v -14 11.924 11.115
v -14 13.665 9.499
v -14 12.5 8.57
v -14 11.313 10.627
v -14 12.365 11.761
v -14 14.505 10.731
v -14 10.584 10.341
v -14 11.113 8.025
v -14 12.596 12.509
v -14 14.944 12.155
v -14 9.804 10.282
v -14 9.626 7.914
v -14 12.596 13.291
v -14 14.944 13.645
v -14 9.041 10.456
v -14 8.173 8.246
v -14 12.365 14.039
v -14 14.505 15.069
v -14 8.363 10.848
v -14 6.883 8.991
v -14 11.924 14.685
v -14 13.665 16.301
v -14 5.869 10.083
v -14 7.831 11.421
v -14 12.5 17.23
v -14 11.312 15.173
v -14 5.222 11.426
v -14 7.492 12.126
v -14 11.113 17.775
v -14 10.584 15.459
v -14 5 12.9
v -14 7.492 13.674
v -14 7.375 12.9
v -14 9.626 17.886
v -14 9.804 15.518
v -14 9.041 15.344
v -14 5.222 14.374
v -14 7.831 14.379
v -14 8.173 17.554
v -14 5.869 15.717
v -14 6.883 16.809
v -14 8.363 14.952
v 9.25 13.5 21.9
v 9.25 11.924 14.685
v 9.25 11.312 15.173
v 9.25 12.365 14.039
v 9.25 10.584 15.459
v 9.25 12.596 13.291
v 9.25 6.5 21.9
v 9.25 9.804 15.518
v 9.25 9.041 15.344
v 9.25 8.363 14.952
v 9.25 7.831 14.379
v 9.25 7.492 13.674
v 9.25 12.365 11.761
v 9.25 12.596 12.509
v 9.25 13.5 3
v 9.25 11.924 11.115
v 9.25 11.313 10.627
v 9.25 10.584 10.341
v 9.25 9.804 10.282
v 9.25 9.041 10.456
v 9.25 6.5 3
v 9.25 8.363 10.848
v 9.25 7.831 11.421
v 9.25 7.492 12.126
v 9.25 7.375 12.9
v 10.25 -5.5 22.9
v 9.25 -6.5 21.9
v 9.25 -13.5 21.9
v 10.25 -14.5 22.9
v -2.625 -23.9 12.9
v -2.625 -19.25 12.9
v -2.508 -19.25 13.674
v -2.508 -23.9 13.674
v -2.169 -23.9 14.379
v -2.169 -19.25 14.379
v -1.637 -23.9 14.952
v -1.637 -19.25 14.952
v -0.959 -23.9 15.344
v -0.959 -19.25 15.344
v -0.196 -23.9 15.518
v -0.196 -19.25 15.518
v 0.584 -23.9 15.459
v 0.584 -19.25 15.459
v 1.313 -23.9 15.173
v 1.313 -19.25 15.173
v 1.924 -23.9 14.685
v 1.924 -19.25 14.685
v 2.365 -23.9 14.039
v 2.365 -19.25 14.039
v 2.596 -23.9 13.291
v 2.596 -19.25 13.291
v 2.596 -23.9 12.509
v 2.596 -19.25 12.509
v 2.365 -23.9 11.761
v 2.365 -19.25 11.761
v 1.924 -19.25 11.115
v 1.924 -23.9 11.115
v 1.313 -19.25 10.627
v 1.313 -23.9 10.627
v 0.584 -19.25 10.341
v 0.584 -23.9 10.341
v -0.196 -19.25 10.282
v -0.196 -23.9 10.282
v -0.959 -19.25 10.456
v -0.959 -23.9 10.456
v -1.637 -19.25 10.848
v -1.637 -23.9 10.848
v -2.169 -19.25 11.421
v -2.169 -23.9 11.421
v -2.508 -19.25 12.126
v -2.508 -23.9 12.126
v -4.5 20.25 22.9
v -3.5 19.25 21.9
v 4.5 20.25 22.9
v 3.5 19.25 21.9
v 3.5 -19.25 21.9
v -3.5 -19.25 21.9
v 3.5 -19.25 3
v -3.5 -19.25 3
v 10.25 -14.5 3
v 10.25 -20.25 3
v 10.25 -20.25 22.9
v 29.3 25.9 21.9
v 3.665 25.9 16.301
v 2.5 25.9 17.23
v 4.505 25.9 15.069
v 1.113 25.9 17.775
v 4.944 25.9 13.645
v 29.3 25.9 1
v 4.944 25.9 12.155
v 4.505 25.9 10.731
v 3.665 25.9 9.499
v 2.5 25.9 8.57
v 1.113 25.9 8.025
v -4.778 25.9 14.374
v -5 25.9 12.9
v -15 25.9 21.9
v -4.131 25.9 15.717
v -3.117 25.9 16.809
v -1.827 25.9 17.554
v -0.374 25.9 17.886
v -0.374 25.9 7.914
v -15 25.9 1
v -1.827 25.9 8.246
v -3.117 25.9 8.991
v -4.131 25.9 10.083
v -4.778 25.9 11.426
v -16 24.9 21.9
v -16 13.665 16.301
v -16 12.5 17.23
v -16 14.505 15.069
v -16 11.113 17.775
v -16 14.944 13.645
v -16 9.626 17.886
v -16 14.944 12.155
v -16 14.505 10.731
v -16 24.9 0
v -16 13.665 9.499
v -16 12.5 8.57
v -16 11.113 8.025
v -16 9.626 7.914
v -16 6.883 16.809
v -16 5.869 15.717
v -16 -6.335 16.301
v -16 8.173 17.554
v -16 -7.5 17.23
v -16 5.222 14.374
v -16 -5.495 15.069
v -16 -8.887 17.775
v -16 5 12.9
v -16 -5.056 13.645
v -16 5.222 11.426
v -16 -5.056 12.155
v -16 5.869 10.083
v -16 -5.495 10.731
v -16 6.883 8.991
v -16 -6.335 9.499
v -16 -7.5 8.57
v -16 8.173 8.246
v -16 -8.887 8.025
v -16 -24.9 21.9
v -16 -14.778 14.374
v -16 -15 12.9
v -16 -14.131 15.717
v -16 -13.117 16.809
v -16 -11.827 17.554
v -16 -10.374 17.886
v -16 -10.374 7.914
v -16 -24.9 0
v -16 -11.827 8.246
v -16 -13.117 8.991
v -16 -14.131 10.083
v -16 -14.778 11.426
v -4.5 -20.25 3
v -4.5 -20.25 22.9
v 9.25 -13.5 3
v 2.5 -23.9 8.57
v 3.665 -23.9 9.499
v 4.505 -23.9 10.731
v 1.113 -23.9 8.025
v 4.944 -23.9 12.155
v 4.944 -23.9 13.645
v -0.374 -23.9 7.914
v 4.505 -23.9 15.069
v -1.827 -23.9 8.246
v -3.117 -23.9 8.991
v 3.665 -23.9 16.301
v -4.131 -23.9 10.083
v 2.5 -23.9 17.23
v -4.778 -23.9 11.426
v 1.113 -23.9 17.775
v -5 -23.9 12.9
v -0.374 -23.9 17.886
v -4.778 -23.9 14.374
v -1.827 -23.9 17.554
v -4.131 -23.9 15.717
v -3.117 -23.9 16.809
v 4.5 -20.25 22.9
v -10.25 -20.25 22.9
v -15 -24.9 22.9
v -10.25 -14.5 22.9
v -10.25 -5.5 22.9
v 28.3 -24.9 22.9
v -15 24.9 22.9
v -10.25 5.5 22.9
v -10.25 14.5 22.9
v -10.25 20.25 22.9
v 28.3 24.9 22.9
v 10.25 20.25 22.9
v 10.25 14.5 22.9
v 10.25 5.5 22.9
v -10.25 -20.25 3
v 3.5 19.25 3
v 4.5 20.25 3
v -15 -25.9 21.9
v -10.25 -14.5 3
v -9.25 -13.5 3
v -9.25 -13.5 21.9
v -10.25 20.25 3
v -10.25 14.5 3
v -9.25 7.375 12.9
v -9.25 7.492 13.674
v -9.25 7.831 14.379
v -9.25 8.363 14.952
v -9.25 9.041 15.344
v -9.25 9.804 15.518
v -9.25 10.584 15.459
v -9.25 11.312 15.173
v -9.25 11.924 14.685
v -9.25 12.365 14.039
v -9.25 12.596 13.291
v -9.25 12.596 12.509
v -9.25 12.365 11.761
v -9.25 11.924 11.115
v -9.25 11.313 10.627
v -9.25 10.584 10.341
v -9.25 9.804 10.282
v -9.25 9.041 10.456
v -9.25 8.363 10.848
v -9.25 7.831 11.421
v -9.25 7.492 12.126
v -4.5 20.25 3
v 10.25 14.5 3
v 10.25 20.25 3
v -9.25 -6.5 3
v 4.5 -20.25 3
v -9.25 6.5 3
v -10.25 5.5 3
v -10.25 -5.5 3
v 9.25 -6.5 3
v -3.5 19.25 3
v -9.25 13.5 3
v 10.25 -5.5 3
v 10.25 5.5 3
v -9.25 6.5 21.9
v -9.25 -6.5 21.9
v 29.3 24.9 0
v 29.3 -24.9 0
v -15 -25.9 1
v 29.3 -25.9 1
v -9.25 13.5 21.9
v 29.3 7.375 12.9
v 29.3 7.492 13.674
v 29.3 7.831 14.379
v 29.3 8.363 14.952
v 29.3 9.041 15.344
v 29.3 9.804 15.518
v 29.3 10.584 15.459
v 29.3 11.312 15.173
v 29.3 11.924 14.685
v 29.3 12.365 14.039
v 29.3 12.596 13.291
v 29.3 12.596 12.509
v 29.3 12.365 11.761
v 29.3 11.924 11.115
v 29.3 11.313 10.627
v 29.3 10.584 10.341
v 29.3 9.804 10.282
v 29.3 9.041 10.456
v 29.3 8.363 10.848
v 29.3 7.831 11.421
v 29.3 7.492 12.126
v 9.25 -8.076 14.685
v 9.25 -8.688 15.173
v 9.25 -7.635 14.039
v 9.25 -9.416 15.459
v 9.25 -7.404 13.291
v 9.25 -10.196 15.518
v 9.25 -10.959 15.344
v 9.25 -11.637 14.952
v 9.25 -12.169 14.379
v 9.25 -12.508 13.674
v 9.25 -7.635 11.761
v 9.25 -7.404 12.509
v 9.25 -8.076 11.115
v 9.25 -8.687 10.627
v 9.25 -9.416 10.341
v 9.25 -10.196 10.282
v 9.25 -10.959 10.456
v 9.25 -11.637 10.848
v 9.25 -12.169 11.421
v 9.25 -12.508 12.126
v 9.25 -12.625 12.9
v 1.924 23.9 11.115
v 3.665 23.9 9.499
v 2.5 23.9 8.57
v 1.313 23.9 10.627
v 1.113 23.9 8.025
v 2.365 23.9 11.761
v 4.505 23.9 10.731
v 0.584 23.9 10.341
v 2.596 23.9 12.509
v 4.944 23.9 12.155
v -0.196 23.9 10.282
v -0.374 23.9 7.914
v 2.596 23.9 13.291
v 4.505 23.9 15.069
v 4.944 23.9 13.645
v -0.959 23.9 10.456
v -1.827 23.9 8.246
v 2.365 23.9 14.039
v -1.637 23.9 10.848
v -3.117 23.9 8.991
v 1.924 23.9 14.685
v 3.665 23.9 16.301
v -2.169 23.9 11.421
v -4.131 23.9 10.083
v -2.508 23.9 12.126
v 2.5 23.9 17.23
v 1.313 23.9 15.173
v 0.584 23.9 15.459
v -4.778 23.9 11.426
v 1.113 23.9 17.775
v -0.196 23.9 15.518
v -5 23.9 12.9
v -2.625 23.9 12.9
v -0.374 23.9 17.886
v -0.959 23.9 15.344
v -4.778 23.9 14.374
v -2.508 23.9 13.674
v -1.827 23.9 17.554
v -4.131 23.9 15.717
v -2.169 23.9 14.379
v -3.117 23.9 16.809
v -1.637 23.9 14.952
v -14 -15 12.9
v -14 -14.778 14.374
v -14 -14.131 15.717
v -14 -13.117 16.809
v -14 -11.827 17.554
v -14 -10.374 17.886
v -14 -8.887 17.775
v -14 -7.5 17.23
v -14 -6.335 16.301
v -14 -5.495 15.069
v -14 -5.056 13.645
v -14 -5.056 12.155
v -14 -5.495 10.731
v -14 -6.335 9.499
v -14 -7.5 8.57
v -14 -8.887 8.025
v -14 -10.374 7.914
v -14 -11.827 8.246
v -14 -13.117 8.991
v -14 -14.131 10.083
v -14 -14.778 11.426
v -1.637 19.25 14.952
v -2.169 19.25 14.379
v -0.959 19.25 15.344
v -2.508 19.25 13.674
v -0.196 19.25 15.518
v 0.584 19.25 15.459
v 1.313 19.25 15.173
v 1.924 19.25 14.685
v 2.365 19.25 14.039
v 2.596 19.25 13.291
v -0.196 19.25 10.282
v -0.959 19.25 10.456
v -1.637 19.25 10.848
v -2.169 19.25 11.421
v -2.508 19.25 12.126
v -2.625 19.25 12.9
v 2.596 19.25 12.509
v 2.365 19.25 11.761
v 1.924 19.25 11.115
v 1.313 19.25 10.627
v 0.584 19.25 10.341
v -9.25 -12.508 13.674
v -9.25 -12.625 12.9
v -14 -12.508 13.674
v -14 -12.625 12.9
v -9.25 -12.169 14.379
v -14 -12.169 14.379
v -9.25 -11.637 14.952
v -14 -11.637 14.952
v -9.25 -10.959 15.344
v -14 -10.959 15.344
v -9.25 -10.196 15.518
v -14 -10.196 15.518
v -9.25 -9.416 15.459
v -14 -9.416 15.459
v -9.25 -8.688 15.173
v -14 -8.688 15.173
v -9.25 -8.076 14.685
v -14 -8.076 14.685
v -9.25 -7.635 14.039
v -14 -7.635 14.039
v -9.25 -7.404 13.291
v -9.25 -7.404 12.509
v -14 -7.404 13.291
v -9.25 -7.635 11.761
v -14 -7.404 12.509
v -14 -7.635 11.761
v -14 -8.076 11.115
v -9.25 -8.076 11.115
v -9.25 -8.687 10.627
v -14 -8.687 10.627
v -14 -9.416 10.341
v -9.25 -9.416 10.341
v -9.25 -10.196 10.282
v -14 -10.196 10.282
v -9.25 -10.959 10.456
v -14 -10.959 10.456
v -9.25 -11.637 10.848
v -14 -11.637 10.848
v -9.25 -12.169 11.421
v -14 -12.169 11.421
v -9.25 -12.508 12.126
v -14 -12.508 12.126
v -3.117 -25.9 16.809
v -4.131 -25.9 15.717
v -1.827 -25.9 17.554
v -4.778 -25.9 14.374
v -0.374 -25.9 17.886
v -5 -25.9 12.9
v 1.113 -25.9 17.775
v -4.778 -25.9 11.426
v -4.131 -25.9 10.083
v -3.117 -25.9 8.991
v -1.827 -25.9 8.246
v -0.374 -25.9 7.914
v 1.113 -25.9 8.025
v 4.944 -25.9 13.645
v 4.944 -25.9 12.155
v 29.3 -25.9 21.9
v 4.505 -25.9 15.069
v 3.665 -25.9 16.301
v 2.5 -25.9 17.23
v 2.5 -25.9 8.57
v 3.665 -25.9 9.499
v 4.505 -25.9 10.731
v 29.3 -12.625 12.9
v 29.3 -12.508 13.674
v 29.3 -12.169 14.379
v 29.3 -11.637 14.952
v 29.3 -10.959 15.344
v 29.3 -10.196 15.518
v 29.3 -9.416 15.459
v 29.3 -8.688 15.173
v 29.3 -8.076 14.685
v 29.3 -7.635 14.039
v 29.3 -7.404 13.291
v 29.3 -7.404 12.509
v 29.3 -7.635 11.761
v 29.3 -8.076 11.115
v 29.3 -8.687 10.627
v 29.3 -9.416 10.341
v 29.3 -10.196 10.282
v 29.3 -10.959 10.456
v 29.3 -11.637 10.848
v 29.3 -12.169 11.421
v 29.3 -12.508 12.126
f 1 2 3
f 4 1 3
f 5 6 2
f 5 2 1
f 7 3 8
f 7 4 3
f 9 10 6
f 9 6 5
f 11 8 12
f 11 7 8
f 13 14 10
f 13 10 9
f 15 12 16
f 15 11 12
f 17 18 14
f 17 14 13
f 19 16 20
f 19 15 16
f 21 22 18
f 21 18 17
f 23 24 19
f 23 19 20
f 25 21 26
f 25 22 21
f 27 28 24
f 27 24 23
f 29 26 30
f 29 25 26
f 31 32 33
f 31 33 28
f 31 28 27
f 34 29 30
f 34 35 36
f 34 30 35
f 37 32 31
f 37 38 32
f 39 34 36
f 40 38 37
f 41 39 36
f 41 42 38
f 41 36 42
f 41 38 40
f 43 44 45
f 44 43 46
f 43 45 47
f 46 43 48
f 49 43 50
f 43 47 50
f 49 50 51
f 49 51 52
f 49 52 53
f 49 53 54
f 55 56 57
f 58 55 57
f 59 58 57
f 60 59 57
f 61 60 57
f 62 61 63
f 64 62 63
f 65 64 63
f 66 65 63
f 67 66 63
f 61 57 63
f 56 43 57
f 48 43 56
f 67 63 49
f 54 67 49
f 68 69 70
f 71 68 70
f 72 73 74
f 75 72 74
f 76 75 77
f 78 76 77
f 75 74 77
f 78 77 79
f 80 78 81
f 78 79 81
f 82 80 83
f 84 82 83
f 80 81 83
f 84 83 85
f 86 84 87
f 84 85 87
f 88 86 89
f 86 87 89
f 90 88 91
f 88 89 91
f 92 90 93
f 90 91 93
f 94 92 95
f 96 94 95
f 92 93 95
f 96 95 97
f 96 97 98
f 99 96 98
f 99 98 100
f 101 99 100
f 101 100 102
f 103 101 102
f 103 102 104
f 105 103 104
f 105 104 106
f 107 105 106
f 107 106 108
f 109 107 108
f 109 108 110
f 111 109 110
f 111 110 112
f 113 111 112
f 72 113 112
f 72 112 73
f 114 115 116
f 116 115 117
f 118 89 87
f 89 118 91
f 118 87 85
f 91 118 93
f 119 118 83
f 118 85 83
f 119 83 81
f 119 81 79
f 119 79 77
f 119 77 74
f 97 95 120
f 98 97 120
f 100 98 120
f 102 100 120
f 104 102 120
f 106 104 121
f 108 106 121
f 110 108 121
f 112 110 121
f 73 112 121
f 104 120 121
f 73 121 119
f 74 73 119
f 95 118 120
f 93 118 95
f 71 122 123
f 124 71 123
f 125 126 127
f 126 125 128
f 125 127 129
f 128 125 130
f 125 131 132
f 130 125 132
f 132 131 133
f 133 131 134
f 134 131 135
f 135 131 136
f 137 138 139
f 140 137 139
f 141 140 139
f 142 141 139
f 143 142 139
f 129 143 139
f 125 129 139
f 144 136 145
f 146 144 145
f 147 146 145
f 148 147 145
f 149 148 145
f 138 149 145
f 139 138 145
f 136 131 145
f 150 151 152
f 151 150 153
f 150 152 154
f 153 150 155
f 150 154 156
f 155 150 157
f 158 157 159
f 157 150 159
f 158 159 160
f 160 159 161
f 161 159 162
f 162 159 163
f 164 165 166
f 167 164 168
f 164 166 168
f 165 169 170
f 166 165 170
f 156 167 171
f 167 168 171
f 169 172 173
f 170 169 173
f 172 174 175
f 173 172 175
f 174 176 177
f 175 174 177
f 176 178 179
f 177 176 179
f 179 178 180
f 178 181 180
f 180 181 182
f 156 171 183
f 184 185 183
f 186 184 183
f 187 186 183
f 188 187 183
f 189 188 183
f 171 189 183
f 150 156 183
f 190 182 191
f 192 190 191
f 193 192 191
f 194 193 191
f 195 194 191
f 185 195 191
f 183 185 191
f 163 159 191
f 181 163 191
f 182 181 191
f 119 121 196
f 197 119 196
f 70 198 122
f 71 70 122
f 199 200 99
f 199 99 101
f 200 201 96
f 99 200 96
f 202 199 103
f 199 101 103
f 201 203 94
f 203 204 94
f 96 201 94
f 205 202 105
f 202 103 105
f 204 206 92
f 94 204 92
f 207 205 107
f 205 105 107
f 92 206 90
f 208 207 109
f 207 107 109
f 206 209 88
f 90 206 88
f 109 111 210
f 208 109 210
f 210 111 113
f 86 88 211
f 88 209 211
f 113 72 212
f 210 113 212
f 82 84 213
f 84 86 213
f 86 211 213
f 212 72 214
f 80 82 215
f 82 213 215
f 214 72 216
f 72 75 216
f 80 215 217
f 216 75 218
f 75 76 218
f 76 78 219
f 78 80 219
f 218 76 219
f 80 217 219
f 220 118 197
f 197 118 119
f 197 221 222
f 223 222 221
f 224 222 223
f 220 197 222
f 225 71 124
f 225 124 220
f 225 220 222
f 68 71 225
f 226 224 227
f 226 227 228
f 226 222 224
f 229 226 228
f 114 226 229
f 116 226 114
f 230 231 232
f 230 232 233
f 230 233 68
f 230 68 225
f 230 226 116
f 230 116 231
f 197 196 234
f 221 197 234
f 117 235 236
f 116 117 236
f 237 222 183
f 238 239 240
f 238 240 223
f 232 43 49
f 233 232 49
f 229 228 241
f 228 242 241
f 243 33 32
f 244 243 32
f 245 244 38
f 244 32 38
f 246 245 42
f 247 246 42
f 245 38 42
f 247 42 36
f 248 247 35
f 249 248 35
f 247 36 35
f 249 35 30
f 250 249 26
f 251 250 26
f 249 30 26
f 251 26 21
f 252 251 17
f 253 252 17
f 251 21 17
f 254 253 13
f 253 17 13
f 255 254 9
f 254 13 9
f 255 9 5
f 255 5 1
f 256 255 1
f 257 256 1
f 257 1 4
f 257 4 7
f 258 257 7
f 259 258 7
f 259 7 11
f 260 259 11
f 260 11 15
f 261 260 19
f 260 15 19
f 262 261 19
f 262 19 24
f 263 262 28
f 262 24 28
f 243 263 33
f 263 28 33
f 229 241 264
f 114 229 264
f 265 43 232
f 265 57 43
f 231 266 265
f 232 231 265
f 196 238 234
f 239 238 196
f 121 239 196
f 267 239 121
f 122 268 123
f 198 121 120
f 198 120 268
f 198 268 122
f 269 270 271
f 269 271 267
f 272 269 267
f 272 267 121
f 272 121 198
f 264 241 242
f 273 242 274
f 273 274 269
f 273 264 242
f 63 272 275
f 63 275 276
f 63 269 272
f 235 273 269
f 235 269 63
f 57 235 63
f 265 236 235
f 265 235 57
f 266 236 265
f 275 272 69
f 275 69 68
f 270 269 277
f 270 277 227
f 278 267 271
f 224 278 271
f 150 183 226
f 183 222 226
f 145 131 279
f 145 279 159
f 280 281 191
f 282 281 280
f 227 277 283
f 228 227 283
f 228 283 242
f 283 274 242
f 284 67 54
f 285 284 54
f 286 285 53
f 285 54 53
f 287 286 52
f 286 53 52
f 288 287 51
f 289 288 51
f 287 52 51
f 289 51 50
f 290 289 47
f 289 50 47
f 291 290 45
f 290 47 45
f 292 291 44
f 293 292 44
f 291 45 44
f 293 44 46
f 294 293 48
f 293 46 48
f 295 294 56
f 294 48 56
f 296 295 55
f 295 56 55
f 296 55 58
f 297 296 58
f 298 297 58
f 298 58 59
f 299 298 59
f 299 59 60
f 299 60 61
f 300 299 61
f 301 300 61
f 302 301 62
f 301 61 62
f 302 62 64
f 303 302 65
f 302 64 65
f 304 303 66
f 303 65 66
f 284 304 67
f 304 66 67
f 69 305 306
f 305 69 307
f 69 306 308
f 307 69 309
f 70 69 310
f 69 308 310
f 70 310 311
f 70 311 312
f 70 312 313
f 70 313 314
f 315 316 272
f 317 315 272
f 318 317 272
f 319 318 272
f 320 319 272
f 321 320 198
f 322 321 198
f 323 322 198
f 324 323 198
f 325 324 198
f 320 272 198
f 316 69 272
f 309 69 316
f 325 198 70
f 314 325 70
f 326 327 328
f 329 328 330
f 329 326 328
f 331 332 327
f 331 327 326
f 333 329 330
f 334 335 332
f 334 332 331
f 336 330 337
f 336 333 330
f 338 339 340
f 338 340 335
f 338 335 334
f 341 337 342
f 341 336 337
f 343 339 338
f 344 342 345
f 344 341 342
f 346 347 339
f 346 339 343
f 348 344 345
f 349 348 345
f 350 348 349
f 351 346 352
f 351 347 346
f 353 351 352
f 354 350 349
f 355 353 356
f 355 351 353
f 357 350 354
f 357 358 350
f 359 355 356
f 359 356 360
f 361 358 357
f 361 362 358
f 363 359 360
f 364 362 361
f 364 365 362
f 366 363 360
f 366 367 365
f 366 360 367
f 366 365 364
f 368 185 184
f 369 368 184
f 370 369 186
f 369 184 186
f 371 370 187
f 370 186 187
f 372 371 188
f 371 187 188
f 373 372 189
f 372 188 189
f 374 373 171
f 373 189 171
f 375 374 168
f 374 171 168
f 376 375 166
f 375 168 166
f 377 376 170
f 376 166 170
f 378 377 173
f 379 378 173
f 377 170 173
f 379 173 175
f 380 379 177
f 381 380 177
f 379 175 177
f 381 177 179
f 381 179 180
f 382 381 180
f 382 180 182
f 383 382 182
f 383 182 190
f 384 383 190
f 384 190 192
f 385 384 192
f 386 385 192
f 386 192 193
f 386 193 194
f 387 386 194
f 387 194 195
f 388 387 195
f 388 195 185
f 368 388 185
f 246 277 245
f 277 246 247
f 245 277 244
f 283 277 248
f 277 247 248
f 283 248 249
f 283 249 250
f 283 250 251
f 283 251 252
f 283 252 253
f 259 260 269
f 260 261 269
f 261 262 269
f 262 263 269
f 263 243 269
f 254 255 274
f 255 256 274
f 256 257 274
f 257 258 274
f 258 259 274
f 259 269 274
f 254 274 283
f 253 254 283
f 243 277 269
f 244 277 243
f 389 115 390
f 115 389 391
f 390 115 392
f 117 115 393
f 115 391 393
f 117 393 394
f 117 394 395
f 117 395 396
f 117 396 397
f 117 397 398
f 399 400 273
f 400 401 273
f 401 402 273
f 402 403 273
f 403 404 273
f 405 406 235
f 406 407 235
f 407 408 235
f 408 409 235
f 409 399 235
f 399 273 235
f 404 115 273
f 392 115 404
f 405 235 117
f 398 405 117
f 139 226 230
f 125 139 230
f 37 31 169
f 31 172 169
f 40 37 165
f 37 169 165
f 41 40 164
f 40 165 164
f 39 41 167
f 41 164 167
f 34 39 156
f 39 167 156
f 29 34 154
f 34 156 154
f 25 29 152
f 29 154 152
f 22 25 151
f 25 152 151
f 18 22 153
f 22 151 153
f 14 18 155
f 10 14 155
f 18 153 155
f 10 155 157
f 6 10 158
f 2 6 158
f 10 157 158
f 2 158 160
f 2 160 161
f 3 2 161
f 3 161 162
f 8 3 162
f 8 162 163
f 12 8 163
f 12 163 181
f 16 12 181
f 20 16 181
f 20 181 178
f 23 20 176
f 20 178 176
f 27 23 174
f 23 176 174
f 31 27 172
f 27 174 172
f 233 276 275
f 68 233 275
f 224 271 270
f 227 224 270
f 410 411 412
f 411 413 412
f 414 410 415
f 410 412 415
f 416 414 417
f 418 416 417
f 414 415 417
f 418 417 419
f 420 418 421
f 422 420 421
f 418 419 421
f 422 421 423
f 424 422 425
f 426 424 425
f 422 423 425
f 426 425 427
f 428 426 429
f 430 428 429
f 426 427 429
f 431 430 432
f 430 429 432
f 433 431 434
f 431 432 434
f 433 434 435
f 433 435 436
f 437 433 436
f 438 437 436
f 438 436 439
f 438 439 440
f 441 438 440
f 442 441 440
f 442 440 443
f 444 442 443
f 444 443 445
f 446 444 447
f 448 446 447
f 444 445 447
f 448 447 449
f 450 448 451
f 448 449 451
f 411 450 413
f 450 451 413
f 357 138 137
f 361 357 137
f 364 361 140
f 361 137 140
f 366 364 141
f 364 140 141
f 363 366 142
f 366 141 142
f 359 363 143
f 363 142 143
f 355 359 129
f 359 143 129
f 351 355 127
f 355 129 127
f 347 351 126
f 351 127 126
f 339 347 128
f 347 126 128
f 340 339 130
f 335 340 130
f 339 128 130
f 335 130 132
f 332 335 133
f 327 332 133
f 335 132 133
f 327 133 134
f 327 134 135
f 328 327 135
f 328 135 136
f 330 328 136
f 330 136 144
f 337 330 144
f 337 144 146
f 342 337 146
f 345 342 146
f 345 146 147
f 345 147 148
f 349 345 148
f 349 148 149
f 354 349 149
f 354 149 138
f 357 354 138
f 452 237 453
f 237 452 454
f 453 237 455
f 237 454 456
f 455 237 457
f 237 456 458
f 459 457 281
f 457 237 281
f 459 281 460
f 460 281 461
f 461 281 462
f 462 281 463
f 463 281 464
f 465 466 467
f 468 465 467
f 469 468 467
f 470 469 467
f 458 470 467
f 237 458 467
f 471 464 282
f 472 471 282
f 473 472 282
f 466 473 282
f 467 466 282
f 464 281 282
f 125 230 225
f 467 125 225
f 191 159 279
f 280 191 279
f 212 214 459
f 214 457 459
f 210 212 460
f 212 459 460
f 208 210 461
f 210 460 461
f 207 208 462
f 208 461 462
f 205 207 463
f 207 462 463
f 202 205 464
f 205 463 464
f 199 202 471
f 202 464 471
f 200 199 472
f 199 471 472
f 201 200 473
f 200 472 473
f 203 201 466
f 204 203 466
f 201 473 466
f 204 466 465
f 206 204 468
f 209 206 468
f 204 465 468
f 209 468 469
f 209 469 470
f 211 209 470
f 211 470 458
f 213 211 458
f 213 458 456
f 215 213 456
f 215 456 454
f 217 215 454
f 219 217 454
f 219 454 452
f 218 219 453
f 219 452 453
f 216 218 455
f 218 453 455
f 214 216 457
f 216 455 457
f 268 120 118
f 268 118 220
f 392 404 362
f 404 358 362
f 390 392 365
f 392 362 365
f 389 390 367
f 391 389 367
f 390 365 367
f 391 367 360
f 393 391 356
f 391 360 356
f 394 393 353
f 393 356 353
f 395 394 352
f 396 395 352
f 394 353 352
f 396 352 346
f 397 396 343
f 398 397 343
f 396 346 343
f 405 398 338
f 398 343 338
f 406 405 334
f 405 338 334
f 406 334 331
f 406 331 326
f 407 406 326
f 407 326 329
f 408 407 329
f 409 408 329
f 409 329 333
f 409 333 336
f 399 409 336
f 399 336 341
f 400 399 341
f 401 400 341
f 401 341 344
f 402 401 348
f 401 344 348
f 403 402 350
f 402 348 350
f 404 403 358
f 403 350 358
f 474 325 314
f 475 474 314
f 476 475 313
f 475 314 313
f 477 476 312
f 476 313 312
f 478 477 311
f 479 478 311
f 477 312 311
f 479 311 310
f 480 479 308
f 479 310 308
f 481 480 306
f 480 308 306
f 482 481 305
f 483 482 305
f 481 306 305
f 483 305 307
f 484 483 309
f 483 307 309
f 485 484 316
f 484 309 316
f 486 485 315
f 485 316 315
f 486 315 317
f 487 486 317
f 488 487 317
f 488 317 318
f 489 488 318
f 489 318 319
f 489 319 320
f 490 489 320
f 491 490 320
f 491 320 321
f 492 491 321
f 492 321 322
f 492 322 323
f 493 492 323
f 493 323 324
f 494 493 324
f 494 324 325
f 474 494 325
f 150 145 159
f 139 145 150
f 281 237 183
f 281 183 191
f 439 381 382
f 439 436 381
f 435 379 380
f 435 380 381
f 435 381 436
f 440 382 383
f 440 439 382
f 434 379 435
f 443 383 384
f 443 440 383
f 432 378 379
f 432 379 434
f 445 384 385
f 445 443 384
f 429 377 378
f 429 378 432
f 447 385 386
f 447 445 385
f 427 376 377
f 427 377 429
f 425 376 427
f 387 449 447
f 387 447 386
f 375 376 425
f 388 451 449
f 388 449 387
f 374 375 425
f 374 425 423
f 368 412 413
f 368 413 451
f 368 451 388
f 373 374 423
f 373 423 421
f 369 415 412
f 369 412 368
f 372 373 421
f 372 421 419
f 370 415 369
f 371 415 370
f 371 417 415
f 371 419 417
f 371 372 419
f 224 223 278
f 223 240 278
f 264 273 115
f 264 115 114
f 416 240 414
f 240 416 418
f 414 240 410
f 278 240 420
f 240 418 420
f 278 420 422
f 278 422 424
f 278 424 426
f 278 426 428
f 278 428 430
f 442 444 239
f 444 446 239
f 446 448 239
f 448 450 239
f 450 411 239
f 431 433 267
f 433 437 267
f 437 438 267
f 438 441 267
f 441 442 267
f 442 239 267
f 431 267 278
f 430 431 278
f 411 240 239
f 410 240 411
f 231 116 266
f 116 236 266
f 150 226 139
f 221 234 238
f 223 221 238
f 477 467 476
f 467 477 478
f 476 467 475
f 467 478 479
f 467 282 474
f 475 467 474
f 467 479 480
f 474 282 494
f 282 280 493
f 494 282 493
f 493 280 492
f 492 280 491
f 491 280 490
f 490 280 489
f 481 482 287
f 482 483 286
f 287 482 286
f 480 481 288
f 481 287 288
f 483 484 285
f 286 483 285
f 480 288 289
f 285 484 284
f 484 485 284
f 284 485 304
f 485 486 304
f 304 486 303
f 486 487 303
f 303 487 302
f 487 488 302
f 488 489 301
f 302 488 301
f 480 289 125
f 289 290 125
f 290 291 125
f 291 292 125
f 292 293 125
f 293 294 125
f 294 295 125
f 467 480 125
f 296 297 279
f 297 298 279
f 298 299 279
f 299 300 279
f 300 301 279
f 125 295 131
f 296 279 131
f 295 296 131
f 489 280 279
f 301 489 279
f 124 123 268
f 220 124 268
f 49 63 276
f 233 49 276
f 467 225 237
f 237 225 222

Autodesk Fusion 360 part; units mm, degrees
sketch "Main Profile" plane through (0, 0, 0) normal (0, 0, 1) x (1, 0, 0)
  line L0 (10.25, -20.25) -> (-10.25, -20.25)
  line L1 (-10.25, -20.25) -> (-10.25, 20.25)
  line L2 (-10.25, 20.25) -> (10.25, 20.25)
  line L3 (10.25, 20.25) -> (10.25, -20.25)
  line L4 (10.25, -20.25) -> (-10.25, 20.25) construction
  line L5 (-10.25, -20.25) -> (10.25, 20.25) construction
  line L6 (-16, -25.9) -> (16, -25.9)
  line L7 (16, -25.9) -> (16, 25.9)
  line L8 (16, 25.9) -> (-16, 25.9)
  line L9 (-16, 25.9) -> (-16, -25.9)
  line L10 (-16, -25.9) -> (16, 25.9) construction
  line L11 (16, -25.9) -> (-16, 25.9) construction
  line L12 (-3.5, 19.25) -> (3.5, 19.25)
  line L13 (3.5, 19.25) -> (4.5, 20.25)
  line L14 (-3.5, 19.25) -> (-4.5, 20.25)
  line L15 (0, 20.25) -> (0, 19.25) construction
  line L16 (-9.25, 6.5) -> (-9.25, 13.5)
  line L17 (-9.25, 13.5) -> (-10.25, 14.5)
  line L18 (-9.25, 6.5) -> (-10.25, 5.5)
  line L19 (9.25, 13.5) -> (9.25, 6.5)
  line L20 (9.25, 6.5) -> (10.25, 5.5)
  line L21 (9.25, 13.5) -> (10.25, 14.5)
  line L22 (9.25, -13.5) -> (10.25, -14.5)
  line L23 (9.25, -6.5) -> (9.25, -13.5)
  line L24 (9.25, -6.5) -> (10.25, -5.5)
  line L25 (3.5, -19.25) -> (4.5, -20.25)
  line L26 (3.5, -19.25) -> (-3.5, -19.25)
  line L27 (-3.5, -19.25) -> (-4.5, -20.25)
  line L28 (-9.25, -13.5) -> (-10.25, -14.5)
  line L29 (-9.25, -13.5) -> (-9.25, -6.5)
  line L30 (-9.25, -6.5) -> (-10.25, -5.5)
  point P0 (0, 10)
  dimension "d1" = 40.5
  dimension "d2" = 20.5
  dimension "d3" = 32
  dimension "d4" = 51.8
  dimension "d5" = 1
  dimension "d6" = 135
  dimension "d7" = 7
  dimension "d8" = 135
  dimension "d9" = 10.25
  dimension "d11" = 360
  dimension "d13" = 360
extrude "Extrude1" add sketch "Main Profile" along normal blind 3 contours L0 L1 L2 L3 L12 L13 L14 L16 L17 L18 L19 L20 L21 L22 L23 L24 L25 L26 L27 L28 L29 L30 | L0 L25 L26 L27 | L3 L22 L23 L24 | L3 L19 L20 L21 | L1 L28 L29 L30 | L1 L16 L17 L18 | L2 L12 L13 L14 | L6 L7 L8 L9
extrude "Extrude2" add sketch "Main Profile" along normal blind 22.9 contours L0 L25 L26 L27 | L3 L22 L23 L24 | L3 L19 L20 L21 | L1 L28 L29 L30 | L1 L16 L17 L18 | L2 L12 L13 L14 | L6 L7 L8 L9
sketch "Short Side" plane through (0, 25.9, 0) normal (0, 1, 0) x (-1, 0, 0)
  line L0 (-16, 0) -> (16, 0)
  line L1 (16, 0) -> (16, 22.9)
  line L2 (16, 22.9) -> (-16, 22.9)
  line L3 (-16, 22.9) -> (-16, 0)
  circle A0 centre (0, 12.9) radius 5
  circle A1 centre (0, 12.9) radius 2.625
  dimension "d18" = 10
  dimension "d19" = 5.25
  dimension "d20" = 12.9
extrude "Extrude3" cut sketch "Short Side" against normal blind 63.819 contours A1
extrude "Extrude4" cut sketch "Short Side" against normal blind 2 contours A0
extrude "Extrude5" cut sketch "Short Side" along normal blind 2 from surface at -51.8 contours A0
sketch "Long Side" plane through (-16, 0, 0) normal (-1, 0, 0) x (0, -1, 0)
  line L0 (-25.9, 0) -> (25.9, 0)
  line L1 (25.9, 0) -> (25.9, 22.9)
  line L2 (25.9, 22.9) -> (-25.9, 22.9)
  line L3 (-25.9, 22.9) -> (-25.9, 0)
  circle A0 centre (-10, 12.9) radius 5
  circle A1 centre (-10, 12.9) radius 2.625
  circle A2 centre (10, 12.9) radius 5
  circle A3 centre (10, 12.9) radius 2.625
  dimension "d28" = 10
  dimension "d29" = 5.25
  dimension "d30" = 10
  dimension "d31" = 12.9
  dimension "d34" = 20
  dimension "d35" = 0
extrude "Extrude6" cut sketch "Long Side" against normal blind 62.946 contours A1 | A3
extrude "Extrude7" cut sketch "Long Side" against normal blind 2 contours A0 | A2
move_face "OffsetFaces1" offset 13.3 1 faces at (16, -21.4652, 11.8029)
chamfer "Chamfer1" distance 1 angle 45 14 edges at (9.25, 10, 22.9) (9.25, -10, 22.9) (-9.25, -10, 22.9) (0, -19.25, 22.9) (-9.25, 10, 22.9) (0, 19.25, 22.9) (6.65, 25.9, 22.9) (29.3, 0, 22.9) (6.65, -25.9, 22.9) (-16, 0, 22.9) (-16, -25.9, 11.45) (-16, 25.9, 11.45) (6.65, -25.9, 0) (6.65, 25.9, 0)
